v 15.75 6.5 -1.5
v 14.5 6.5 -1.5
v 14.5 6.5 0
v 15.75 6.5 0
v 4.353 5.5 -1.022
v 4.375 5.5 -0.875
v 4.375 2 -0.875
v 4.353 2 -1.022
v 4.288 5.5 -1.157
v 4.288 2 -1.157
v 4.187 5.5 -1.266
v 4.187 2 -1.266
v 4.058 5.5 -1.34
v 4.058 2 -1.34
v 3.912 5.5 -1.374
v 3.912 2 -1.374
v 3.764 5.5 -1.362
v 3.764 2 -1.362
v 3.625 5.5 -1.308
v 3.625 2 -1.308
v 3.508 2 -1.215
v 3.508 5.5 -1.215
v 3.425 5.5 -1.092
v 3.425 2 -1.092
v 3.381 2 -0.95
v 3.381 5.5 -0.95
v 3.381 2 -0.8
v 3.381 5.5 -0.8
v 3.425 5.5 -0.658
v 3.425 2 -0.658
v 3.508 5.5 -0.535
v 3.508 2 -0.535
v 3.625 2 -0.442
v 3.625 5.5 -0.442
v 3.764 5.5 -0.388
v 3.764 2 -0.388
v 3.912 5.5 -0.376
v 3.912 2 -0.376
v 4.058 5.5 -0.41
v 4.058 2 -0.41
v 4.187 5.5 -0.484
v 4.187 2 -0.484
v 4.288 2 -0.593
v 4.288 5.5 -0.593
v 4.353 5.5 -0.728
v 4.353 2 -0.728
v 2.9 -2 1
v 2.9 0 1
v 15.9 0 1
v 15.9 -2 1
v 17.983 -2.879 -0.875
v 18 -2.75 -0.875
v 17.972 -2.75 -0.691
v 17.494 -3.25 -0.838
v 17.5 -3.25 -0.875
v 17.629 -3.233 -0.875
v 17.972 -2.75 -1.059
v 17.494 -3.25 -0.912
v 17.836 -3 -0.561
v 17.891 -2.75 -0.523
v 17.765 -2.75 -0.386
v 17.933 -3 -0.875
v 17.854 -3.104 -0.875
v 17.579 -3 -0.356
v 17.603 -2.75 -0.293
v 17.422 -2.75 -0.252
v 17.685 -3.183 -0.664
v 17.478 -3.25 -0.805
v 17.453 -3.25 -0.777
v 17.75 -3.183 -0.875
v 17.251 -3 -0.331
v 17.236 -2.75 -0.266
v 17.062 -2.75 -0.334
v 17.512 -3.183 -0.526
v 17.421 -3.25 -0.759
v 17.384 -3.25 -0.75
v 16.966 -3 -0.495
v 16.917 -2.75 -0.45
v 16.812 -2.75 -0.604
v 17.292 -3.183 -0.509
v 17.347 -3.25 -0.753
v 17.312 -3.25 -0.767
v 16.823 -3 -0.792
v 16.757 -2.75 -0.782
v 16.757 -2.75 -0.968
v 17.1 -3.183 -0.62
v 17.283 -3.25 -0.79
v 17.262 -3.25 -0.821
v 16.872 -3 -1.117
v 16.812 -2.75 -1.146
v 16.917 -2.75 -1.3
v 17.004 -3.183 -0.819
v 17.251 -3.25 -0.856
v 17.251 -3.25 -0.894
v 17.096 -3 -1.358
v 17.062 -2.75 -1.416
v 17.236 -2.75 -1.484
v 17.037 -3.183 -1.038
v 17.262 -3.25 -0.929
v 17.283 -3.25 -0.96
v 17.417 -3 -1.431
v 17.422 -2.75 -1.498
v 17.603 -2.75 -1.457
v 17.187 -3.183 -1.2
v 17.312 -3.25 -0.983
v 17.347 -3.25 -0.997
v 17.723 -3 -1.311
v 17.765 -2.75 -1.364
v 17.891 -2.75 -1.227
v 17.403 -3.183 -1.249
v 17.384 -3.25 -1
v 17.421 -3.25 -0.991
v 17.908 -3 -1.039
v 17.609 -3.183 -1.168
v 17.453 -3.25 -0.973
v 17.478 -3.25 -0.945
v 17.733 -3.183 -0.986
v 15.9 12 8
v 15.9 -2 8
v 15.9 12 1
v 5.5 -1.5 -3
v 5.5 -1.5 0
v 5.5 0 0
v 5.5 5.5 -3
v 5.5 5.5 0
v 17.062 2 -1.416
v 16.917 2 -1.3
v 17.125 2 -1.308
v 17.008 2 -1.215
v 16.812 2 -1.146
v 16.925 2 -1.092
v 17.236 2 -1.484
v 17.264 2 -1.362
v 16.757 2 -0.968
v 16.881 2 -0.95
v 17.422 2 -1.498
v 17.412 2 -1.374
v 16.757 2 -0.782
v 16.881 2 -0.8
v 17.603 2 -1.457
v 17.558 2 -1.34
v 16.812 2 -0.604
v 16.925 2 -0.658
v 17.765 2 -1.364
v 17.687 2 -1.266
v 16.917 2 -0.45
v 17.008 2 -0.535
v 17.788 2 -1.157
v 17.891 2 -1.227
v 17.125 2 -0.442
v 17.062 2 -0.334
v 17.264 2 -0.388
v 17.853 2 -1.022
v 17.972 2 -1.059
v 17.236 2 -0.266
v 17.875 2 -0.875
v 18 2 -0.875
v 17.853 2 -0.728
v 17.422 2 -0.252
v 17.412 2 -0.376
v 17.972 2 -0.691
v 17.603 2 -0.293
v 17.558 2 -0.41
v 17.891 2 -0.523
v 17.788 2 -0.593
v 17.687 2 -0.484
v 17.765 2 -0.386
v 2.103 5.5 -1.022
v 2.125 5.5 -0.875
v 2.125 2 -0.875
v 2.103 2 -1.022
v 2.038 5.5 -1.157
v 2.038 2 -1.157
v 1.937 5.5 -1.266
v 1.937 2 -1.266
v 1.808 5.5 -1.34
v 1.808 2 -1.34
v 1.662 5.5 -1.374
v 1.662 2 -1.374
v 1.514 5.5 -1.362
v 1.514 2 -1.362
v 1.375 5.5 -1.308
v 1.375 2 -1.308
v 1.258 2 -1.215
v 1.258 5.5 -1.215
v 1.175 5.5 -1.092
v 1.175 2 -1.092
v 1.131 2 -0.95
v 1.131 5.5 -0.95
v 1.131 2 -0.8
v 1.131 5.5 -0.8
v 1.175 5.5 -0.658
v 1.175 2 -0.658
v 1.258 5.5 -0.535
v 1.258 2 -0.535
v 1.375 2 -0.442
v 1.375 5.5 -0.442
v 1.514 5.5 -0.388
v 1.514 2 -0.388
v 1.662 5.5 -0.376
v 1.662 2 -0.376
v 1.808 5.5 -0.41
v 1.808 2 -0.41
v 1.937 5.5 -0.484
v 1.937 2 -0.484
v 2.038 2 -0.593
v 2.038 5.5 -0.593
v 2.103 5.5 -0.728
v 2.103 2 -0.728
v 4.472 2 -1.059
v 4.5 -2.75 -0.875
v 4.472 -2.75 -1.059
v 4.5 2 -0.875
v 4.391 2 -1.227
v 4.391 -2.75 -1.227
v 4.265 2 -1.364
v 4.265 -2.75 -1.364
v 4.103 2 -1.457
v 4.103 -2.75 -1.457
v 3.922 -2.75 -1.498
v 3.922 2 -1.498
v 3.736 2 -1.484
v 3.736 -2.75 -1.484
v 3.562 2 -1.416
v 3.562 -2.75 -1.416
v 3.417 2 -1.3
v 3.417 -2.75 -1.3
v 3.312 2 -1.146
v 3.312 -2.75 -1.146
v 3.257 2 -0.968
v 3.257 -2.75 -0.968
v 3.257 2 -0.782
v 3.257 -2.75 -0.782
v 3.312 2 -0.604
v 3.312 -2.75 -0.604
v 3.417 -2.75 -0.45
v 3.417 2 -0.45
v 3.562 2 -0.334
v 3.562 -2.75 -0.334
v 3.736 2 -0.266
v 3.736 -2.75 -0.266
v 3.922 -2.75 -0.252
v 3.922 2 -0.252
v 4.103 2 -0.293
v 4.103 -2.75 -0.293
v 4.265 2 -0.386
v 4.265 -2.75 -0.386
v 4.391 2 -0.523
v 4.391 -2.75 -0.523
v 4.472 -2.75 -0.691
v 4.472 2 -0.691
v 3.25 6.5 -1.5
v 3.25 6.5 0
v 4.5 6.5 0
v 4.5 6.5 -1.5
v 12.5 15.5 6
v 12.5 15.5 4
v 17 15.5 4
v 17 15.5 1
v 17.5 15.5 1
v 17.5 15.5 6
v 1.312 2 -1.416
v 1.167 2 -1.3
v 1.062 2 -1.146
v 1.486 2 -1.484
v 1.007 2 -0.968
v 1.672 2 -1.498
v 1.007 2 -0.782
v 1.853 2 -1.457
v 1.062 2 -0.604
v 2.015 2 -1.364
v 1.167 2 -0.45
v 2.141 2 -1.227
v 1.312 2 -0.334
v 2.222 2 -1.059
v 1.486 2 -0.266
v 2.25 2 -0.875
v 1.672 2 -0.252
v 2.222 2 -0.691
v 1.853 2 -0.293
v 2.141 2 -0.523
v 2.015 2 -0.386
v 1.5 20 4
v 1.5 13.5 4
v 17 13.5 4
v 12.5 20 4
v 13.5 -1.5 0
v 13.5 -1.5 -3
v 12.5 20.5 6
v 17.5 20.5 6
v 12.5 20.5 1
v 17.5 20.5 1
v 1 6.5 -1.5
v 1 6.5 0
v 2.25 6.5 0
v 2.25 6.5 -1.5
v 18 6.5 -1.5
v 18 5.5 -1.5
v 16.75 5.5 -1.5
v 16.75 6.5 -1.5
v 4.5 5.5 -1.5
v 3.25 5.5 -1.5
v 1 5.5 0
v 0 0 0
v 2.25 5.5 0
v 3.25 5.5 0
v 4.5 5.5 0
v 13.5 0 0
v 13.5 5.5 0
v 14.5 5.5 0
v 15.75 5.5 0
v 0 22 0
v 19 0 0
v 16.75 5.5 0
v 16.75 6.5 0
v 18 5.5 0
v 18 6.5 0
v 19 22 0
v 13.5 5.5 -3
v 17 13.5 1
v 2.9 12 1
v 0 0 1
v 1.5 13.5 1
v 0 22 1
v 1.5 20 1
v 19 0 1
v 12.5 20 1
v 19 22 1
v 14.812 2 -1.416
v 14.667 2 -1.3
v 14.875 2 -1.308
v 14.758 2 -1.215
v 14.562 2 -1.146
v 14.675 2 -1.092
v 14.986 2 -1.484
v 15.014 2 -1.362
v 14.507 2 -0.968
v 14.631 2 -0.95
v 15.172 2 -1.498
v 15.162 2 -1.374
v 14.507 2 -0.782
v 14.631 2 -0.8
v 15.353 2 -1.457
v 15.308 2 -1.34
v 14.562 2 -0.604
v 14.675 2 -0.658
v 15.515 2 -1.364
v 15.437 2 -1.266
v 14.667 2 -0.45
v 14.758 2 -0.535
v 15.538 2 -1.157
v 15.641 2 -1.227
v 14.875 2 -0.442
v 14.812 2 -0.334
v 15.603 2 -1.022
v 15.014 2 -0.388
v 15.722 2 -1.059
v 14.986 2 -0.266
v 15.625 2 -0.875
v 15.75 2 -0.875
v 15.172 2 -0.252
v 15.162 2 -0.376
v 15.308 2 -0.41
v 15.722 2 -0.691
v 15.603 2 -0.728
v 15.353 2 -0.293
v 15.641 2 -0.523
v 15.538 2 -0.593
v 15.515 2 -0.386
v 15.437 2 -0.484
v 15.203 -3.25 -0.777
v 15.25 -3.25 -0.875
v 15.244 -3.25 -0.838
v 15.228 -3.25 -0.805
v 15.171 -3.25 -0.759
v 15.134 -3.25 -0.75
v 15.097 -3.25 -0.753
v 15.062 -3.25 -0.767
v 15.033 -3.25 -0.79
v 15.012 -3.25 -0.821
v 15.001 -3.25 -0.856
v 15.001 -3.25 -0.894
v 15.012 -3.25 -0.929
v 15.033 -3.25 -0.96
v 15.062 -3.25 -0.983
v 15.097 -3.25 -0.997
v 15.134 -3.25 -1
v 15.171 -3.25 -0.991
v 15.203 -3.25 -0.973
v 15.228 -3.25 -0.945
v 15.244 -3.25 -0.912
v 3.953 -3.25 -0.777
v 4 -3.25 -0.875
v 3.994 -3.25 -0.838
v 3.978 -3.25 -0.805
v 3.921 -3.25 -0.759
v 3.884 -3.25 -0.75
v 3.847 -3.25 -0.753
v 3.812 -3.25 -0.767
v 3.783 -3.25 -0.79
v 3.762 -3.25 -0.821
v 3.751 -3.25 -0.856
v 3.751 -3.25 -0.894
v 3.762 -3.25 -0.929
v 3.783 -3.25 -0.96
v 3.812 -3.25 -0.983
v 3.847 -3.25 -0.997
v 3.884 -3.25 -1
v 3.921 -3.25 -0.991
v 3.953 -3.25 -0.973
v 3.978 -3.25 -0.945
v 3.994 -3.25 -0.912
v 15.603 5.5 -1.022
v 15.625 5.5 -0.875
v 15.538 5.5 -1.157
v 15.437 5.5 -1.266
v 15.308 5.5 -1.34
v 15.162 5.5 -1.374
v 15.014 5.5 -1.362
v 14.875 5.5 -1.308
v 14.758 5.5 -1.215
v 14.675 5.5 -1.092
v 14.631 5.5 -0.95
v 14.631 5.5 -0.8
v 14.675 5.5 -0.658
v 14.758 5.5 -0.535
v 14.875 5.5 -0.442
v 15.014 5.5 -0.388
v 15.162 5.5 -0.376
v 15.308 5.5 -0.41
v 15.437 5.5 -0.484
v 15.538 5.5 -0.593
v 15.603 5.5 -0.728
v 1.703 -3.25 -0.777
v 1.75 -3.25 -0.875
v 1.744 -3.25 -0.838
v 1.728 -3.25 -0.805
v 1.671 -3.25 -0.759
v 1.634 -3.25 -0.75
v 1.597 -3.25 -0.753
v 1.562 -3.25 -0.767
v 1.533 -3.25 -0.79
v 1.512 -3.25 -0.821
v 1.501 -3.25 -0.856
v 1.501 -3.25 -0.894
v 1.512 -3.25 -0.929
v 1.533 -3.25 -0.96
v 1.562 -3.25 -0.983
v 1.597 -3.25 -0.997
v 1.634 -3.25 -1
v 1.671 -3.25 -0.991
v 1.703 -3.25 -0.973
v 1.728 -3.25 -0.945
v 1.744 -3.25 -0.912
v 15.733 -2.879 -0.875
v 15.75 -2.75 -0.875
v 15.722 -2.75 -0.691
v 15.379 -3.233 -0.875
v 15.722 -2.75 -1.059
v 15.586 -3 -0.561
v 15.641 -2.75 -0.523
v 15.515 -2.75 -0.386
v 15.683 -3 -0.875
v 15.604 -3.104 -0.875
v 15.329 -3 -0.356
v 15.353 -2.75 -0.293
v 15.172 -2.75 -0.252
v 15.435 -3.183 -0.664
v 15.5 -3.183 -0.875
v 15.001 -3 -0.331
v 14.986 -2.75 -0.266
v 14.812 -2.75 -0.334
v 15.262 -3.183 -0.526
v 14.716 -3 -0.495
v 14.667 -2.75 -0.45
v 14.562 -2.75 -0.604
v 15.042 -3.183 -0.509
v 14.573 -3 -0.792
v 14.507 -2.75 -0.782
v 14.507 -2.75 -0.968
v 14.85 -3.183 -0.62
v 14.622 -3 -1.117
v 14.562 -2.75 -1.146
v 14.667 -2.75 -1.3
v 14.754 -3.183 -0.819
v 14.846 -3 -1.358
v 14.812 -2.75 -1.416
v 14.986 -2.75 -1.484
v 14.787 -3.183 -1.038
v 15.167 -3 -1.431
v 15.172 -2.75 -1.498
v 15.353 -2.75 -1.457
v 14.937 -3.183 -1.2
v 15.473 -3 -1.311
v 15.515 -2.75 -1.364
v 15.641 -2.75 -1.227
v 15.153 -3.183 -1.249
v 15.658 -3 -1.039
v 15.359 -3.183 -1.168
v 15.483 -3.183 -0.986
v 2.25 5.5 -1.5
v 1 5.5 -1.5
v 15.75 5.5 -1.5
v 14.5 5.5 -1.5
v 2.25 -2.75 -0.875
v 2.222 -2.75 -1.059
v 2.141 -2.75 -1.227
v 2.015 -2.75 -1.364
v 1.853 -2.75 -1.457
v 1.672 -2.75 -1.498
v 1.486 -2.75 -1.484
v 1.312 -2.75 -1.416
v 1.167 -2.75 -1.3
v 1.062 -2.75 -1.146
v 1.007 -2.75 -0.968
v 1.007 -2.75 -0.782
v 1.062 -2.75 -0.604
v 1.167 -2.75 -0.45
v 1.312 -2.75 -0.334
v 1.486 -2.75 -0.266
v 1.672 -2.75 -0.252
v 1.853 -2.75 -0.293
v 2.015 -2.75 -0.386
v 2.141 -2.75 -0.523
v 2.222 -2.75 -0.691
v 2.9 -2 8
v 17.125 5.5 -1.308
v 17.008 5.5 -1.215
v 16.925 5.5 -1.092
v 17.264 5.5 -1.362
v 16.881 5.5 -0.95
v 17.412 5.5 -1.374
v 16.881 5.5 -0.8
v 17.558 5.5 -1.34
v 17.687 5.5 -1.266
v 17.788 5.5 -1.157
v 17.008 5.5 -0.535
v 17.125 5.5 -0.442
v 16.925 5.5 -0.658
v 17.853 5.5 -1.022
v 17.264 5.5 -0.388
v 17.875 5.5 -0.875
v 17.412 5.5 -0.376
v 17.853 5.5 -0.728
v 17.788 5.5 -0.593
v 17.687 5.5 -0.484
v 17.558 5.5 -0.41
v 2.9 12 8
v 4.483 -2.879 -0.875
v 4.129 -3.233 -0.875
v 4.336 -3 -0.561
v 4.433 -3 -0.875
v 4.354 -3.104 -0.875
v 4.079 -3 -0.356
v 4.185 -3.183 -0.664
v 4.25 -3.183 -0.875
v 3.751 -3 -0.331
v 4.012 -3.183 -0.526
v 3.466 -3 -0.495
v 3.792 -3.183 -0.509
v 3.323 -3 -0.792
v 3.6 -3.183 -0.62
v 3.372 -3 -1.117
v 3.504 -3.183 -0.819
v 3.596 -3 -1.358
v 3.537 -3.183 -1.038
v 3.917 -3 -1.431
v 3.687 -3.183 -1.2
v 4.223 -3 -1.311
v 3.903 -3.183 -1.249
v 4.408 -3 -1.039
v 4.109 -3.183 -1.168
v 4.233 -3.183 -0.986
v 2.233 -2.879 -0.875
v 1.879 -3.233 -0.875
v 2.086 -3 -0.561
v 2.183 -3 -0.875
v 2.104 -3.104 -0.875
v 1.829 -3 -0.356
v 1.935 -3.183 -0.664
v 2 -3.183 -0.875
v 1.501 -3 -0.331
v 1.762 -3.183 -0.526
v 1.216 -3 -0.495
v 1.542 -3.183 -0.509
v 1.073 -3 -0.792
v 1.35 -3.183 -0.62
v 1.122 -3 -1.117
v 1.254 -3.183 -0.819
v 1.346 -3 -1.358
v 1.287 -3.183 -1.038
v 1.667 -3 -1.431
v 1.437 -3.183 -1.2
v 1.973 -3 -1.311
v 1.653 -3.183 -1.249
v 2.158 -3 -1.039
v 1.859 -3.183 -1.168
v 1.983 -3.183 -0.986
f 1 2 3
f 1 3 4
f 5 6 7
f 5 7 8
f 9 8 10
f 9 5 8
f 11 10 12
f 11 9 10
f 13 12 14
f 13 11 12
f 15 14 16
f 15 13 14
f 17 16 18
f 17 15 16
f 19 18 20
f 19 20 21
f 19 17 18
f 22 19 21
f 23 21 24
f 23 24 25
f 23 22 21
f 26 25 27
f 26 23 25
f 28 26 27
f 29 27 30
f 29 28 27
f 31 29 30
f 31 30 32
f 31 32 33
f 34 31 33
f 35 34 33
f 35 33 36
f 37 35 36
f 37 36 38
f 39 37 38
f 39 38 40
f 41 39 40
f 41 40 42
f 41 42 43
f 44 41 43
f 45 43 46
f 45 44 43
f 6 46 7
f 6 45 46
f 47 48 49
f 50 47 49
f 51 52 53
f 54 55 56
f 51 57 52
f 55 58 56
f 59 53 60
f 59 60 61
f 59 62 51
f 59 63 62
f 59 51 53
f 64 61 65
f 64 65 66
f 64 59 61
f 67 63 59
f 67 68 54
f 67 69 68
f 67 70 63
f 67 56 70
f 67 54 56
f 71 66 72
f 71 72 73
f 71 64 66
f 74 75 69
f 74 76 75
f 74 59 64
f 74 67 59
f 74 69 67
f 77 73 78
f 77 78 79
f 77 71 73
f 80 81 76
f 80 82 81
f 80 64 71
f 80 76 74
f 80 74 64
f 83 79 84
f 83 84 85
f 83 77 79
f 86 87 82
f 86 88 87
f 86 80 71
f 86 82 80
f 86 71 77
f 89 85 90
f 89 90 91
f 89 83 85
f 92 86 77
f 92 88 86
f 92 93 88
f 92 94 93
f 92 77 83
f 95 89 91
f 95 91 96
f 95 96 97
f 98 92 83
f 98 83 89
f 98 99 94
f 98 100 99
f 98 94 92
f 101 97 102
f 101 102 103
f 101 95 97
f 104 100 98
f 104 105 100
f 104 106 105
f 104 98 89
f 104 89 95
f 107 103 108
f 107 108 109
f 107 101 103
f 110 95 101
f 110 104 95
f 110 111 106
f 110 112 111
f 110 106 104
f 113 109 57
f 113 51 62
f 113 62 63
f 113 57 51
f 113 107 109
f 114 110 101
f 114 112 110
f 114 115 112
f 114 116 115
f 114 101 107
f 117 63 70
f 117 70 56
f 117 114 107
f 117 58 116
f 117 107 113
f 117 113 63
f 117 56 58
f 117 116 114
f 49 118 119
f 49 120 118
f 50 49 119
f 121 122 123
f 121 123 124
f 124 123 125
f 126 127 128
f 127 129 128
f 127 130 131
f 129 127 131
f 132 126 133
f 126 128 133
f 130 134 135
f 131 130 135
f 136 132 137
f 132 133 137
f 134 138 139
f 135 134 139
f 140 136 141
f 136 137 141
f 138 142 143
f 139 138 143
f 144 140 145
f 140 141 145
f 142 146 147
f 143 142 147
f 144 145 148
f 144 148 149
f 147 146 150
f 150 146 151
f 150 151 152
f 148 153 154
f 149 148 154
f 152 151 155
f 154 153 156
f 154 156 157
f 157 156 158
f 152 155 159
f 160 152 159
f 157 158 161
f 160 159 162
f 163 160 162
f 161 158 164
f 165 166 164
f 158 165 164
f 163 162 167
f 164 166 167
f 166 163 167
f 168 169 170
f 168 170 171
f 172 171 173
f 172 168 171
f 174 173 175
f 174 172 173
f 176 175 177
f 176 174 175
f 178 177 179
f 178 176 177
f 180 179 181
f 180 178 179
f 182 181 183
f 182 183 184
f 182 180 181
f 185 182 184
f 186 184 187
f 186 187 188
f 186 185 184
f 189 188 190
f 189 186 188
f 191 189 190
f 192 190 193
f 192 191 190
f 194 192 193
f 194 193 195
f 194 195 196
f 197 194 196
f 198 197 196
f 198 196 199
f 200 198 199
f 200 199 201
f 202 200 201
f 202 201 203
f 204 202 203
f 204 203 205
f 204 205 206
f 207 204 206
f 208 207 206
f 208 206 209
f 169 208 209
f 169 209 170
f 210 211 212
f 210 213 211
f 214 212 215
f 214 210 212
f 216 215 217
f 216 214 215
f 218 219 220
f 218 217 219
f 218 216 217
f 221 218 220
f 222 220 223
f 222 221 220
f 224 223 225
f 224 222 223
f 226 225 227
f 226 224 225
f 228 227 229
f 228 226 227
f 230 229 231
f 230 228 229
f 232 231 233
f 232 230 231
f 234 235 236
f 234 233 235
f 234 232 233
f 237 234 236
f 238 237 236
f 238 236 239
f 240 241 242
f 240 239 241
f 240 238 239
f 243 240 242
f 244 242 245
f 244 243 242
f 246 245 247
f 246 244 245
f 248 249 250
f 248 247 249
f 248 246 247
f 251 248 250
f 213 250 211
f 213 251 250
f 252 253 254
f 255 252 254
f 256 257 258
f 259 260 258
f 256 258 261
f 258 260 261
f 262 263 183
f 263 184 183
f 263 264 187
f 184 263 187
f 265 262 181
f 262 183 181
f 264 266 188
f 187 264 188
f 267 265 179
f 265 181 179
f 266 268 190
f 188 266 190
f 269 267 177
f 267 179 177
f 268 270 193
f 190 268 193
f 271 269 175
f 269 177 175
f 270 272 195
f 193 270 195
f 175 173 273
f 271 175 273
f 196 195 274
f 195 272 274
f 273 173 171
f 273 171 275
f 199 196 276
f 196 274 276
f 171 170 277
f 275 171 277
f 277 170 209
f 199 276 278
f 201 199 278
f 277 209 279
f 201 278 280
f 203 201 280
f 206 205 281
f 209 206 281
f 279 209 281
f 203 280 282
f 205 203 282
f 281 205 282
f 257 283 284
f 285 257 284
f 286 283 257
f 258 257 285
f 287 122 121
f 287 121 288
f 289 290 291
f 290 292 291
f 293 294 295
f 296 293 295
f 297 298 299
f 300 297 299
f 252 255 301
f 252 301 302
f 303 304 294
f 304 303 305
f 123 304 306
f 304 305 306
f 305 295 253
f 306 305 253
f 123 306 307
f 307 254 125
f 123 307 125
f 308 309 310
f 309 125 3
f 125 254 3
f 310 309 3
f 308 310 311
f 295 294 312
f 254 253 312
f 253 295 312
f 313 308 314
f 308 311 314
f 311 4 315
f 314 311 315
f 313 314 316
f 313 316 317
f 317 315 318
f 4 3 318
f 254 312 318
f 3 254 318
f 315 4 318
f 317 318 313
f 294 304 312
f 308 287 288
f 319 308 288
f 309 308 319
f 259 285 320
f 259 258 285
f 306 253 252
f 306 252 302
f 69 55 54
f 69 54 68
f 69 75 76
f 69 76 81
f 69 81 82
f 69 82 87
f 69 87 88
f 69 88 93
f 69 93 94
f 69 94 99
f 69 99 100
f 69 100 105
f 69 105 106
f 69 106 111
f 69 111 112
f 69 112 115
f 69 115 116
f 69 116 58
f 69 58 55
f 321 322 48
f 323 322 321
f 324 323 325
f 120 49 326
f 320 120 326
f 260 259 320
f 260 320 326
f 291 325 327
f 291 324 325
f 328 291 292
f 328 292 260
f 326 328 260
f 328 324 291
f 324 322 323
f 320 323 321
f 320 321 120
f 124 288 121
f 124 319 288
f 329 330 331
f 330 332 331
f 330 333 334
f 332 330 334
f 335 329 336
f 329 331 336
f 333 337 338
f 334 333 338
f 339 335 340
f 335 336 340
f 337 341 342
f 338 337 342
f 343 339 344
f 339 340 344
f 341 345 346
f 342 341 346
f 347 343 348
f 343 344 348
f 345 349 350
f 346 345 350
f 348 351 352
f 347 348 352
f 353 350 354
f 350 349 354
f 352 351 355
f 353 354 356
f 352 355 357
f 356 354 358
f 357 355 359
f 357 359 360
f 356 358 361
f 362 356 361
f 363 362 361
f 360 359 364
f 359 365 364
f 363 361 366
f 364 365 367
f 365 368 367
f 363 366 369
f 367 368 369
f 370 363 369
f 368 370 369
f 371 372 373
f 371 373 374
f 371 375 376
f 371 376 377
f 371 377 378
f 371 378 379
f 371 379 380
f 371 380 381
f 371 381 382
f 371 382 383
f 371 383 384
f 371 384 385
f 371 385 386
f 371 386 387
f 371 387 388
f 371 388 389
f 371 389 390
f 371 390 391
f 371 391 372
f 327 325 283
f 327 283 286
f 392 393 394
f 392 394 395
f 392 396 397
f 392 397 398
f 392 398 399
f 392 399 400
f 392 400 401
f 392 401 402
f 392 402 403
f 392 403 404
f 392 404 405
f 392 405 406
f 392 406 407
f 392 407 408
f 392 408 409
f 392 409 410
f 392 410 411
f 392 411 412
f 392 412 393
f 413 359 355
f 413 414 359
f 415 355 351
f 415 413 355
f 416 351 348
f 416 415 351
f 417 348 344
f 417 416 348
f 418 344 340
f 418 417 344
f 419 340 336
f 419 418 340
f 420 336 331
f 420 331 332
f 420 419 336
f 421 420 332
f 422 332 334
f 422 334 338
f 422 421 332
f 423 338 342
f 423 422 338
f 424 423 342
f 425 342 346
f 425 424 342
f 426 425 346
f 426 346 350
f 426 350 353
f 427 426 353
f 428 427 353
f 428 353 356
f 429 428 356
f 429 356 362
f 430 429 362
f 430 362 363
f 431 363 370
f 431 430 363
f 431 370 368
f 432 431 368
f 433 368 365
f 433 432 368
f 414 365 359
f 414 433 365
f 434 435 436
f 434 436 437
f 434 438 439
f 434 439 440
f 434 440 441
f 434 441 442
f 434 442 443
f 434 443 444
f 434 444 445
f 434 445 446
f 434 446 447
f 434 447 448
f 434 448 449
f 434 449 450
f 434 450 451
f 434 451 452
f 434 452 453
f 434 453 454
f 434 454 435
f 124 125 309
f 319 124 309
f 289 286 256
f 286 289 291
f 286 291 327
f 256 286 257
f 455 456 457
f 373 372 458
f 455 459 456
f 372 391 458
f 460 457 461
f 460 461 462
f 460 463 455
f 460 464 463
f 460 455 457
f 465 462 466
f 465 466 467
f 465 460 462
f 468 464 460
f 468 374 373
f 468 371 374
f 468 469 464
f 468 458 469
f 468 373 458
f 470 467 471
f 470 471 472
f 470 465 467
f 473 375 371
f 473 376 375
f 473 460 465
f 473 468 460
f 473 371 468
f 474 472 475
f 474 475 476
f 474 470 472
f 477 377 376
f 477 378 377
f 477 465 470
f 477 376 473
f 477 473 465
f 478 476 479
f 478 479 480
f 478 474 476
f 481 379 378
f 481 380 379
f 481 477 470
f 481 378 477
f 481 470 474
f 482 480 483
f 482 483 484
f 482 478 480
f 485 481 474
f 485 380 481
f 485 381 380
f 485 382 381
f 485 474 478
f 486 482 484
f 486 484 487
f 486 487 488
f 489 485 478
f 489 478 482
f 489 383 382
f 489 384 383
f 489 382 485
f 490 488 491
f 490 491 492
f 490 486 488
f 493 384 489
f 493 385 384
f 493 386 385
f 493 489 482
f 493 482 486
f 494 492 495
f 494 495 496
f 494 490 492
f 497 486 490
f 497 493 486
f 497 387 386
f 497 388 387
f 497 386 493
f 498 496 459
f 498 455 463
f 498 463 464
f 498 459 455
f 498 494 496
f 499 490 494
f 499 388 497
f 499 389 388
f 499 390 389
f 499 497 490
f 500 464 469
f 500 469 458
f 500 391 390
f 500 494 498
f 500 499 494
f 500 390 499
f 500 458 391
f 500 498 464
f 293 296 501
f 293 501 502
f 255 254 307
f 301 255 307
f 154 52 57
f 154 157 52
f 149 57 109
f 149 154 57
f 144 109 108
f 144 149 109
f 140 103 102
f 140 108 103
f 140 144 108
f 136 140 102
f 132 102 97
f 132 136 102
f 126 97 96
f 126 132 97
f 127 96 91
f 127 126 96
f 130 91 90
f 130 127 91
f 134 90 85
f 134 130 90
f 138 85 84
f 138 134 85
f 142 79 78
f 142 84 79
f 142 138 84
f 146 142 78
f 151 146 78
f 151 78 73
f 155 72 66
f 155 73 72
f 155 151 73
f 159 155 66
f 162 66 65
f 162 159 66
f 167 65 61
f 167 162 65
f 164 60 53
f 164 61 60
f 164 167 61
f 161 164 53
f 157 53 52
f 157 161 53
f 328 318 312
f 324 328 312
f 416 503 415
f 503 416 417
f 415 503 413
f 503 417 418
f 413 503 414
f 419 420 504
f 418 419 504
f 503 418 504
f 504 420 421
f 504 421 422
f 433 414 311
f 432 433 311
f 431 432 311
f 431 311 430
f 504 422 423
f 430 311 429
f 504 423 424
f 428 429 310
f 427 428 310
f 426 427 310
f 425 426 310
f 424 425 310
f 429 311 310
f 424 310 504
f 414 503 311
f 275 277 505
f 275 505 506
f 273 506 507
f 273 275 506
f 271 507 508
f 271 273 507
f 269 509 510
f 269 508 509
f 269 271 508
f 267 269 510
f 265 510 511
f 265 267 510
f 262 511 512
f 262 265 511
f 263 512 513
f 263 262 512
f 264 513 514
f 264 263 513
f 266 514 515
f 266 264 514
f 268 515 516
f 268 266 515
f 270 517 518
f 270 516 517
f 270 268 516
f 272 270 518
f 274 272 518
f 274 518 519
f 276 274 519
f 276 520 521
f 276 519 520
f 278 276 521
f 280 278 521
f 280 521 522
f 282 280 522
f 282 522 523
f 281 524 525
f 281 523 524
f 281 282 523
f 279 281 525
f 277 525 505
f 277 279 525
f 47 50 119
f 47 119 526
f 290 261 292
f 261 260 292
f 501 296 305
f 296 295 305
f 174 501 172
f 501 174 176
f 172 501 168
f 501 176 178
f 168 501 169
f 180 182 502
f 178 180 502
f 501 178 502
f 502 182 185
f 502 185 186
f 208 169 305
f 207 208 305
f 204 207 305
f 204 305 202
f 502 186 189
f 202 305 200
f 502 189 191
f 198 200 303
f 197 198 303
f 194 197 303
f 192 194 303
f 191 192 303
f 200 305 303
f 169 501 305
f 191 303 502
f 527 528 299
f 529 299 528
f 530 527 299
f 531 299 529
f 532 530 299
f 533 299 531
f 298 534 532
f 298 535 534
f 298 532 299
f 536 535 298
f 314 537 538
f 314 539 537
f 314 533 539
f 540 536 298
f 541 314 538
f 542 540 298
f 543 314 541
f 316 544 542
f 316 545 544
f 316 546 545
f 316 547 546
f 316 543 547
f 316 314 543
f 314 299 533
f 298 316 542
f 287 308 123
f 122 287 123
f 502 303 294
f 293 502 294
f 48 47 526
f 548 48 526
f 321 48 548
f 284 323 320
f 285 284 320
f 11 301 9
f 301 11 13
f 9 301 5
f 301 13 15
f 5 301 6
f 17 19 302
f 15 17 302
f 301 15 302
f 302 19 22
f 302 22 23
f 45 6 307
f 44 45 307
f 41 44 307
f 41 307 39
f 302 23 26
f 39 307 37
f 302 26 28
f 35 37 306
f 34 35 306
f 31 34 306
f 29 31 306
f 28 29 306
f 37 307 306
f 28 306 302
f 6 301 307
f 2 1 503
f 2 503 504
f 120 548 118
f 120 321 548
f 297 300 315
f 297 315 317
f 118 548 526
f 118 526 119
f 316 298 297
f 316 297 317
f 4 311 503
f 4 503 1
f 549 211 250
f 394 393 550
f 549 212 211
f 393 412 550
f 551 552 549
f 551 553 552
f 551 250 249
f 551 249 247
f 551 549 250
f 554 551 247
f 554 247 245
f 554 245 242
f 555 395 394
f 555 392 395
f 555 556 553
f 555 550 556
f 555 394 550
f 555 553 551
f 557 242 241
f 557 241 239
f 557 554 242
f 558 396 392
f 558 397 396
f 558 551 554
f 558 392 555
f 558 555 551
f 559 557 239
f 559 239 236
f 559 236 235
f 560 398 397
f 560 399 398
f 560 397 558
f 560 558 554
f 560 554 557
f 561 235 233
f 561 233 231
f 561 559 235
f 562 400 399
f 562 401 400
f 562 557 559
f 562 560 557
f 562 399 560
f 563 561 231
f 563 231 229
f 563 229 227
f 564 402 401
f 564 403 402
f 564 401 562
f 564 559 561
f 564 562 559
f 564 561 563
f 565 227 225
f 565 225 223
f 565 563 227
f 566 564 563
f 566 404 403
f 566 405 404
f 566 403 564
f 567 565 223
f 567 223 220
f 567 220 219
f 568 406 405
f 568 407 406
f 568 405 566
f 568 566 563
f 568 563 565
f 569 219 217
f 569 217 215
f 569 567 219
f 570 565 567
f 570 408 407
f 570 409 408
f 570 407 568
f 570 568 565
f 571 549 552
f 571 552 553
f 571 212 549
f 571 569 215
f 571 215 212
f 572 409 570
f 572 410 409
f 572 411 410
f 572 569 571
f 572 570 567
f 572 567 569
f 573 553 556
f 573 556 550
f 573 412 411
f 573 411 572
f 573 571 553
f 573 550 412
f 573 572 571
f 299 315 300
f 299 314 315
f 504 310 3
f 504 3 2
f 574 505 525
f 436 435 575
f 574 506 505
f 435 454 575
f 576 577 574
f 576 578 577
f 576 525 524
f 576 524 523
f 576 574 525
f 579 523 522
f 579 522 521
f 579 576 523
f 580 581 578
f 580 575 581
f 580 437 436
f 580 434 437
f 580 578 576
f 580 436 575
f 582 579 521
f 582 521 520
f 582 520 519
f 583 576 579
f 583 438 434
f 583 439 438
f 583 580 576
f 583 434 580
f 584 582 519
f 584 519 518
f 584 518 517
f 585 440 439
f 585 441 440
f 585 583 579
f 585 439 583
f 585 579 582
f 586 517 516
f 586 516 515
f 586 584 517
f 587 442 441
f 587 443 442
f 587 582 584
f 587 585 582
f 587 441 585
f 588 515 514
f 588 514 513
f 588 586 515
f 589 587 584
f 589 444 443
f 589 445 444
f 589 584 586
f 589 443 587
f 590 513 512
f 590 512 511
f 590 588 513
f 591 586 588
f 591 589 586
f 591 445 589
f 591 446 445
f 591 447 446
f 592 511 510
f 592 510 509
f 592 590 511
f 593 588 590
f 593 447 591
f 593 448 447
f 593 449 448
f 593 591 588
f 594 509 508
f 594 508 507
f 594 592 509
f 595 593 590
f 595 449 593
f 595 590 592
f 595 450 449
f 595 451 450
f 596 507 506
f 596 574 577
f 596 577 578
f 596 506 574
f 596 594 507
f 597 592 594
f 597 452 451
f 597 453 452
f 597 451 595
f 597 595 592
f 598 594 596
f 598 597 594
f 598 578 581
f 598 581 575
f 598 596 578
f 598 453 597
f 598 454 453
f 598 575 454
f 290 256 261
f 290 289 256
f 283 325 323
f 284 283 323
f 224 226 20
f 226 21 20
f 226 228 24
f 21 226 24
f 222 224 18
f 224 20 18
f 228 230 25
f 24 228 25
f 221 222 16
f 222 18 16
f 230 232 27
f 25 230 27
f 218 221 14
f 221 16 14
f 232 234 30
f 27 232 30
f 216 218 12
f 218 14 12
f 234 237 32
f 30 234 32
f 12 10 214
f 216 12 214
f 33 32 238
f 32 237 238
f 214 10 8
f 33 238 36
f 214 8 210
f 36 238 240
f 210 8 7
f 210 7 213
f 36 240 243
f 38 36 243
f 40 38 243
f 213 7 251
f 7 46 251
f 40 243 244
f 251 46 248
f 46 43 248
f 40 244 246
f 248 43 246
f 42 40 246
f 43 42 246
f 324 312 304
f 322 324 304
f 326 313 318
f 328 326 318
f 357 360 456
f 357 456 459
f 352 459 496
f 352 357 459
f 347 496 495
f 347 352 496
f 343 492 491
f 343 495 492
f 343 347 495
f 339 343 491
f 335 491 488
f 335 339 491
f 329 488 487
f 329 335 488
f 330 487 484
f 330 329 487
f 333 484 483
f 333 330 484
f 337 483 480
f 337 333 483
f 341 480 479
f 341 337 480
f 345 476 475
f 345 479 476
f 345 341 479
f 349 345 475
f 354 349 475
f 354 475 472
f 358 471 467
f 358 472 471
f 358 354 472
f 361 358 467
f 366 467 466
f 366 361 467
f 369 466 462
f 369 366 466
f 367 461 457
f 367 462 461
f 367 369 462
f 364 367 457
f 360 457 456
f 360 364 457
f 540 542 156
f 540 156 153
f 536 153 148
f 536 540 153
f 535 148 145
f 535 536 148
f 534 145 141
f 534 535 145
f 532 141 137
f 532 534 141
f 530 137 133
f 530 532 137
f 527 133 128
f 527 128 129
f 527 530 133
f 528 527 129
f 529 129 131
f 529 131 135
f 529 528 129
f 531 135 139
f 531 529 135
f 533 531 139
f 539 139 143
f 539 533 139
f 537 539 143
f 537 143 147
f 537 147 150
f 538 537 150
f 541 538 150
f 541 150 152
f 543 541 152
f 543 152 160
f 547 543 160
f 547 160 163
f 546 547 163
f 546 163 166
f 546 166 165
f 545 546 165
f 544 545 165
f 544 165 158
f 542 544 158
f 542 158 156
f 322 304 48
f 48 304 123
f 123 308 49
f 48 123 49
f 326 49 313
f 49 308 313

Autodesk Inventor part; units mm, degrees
ref_plane "YZ Plane" through (0, 0, 0) normal (1, 0, 0) x (0, 1, 0)
ref_plane "XZ Plane" through (0, 0, 0) normal (0, 1, 0) x (-1, 0, 0)
ref_plane "XY Plane" through (0, 0, 0) normal (0, 0, 1) x (1, 0, 0)
sketch "Sketch1" plane through (0, 0, 0) normal (0, 0, 1) x (1, 0, 0)
  line L0 (0, 0) -> (19, 0)
  line L1 (19, 0) -> (19, 22)
  line L2 (19, 22) -> (0, 22)
  line L3 (0, 22) -> (0, 0)
  dimension "d0" = 19
  dimension "d1" = 22
extrude "Extrusion1" add sketch "Sketch1" along normal blind 1
sketch "Sketch2" plane through (0, 0, 1) normal (0, 0, 1) x (1, 0, 0)
  line L0 (0, 0) -> (19, 0) projected
  line L1 (0, 0) -> (2.9, 0)
  line L2 (2.9, 0) -> (2.9, 12)
  line L3 (2.9, 12) -> (0, 12)
  line L4 (0, 12) -> (0, 0)
  line L5 (2.9, 12) -> (15.9, 12)
  line L6 (15.9, 12) -> (15.9, -2)
  line L7 (15.9, -2) -> (2.9, -2)
  line L8 (2.9, -2) -> (2.9, 12)
  dimension "d4" = 2.9
  dimension "d5" = 12
  dimension "d6" = 13
  dimension "d7" = 14
extrude "Extrusion2" add sketch "Sketch2" along normal blind 7 contours L2 L5 L6 L0 | L0 L6 L7 L8
sketch "Sketch3" plane through (0, 0, 0) normal (0, 0, -1) x (-1, 0, 0)
  line L0 (-19, 0) -> (-19, 22) projected
  line L1 (-19, 0) -> (-13.5, 0)
  line L2 (-13.5, 0) -> (-13.5, 5)
  line L3 (-13.5, 5) -> (-19, 5)
  line L4 (-19, 5) -> (-19, 0)
  line L5 (-13.5, 0) -> (-5.5, 0)
  line L6 (-5.5, 0) -> (-5.5, 5.5)
  line L7 (-5.5, 5.5) -> (-13.5, 5.5)
  line L8 (-13.5, 5.5) -> (-13.5, 0)
  line L9 (-13.5, 0) -> (-5.5, 0)
  line L10 (-5.5, 0) -> (-5.5, -1.5)
  line L11 (-5.5, -1.5) -> (-13.5, -1.5)
  line L12 (-13.5, -1.5) -> (-13.5, 0)
  point P0 (0, 0)
  dimension "d10" = 5.5
  dimension "d11" = 5
  dimension "d12" = 8
  dimension "d13" = 5.5
  dimension "d16" = 8
  dimension "d17" = 1.5
extrude "Extrusion3" add sketch "Sketch3" along normal blind 3 contours L2 L8 L7 L6 L5 | L5 L10 L11 L12
sketch "Sketch4" plane through (0, 0, 1) normal (0, 0, 1) x (1, 0, 0)
  line L0 (19, 22) -> (0, 22) projected
  line L1 (0, 22) -> (1.5, 22)
  line L2 (1.5, 22) -> (1.5, 20.5)
  line L3 (1.5, 20.5) -> (0, 20.5)
  line L4 (0, 20.5) -> (0, 22)
  line L5 (19, 22) -> (17.5, 22)
  line L6 (17.5, 22) -> (17.5, 20.5)
  line L7 (17.5, 20.5) -> (19, 20.5)
  line L8 (19, 20.5) -> (19, 22)
  line L9 (17.5, 20.5) -> (1.5, 20.5)
  line L10 (1.5, 20.5) -> (1.5, 13.5)
  line L11 (1.5, 13.5) -> (17.5, 13.5)
  line L12 (17.5, 13.5) -> (17.5, 20.5)
  point P0 (0, 0)
  dimension "d18" = 1.5
  dimension "d19" = 1.5
  dimension "d20" = 1.5
  dimension "d21" = 1.5
  dimension "d22" = 16
  dimension "d23" = 7
extrude "Extrusion4" add sketch "Sketch4" along normal blind 3 contours L12 L11 L10 L9
sketch "Sketch5" plane through (0, 0, 4) normal (0, 0, 1) x (1, 0, 0)
  line L0 (17.5, 20.5) -> (1.5, 20.5) projected
  line L1 (17.5, 20.5) -> (12.5, 20.5)
  line L2 (12.5, 20.5) -> (12.5, 15.5)
  line L3 (12.5, 15.5) -> (17.5, 15.5)
  line L4 (17.5, 15.5) -> (17.5, 20.5)
  point P0 (0, 0)
  dimension "d26" = 5
  dimension "d27" = 5
extrude "Extrusion5" add sketch "Sketch5" along normal blind 2
sketch "Sketch6" plane through (1.5, 20.5, 1) normal (0, 1, 0) x (1, 0, 0)
  line L0 (0, -3) -> (16, -3) projected
  line L1 (0, -3) -> (11, -3)
  line L2 (11, -3) -> (11, 0)
  line L3 (11, 0) -> (0, 0)
  line L4 (0, 0) -> (0, -3)
  point P0 (-1.5, 1)
  dimension "d30" = 11
  dimension "d31" = 3
extrude "Extrusion6" cut sketch "Sketch6" against normal blind 0.5
sketch "Sketch7" plane through (17.5, 13.5, 1) normal (1, 0, 0) x (0, 0, -1)
  line L0 (0, 0) -> (-3, 0) projected
  line L1 (-3, 0) -> (0, 0)
  line L2 (0, 0) -> (0, 2)
  line L3 (0, 2) -> (-3, 2)
  line L4 (-3, 2) -> (-3, 0)
  point P0 (1, -13.5)
  dimension "d34" = 3
  dimension "d35" = 2
extrude "Extrusion7" cut sketch "Sketch7" against normal blind 0.5
sketch "Sketch8" plane through (0, 0, 0) normal (0, 0, -1) x (-1, 0, 0)
  line L0 (-19, 0) -> (-19, 22) projected
  line L1 (-19, 0) -> (-18, 0)
  line L2 (-18, 0) -> (-18, 6)
  line L3 (-18, 6) -> (-19, 6)
  line L4 (-19, 6) -> (-19, 0)
  line L5 (-18, 6) -> (-16.75, 6)
  line L6 (-16.75, 6) -> (-16.75, 5.5)
  line L7 (-16.75, 5.5) -> (-18, 5.5)
  line L8 (-18, 5.5) -> (-18, 6)
  line L9 (-16.75, 5.5) -> (-15.75, 5.5)
  line L10 (-15.75, 5.5) -> (-15.75, 6)
  line L11 (-15.75, 6) -> (-16.75, 6)
  line L12 (-16.75, 6) -> (-16.75, 5.5)
  line L13 (-15.75, 5.5) -> (-14.5, 5.5)
  line L14 (-14.5, 5.5) -> (-14.5, 6)
  line L15 (-14.5, 6) -> (-15.75, 6)
  line L16 (-15.75, 6) -> (-15.75, 5.5)
  line L17 (-13.5, 5.5) -> (-5.5, 5.5) projected
  line L18 (-14.5, 6) -> (-13.5, 6)
  line L19 (-13.5, 6) -> (-13.5, 5.5)
  line L20 (-13.5, 5.5) -> (-14.5, 5.5)
  line L21 (-14.5, 5.5) -> (-14.5, 6)
  point P0 (0, 0)
  dimension "d38" = 1
  dimension "d39" = 6
  dimension "d40" = 1.25
  dimension "d41" = 0.5
  dimension "d42" = 1
  dimension "d43" = 1.25
  dimension "d44" = 1
  dimension "d45" = 0.5
extrude "Extrusion8" add sketch "Sketch8" along normal blind 1.5 contours L5 L6 L7 L2 | L15 L14 L13 L10
sketch "Sketch9" plane through (14.5, 6, 0) normal (0, 1, 0) x (1, 0, 0)
  line L0 (1.25, 1.5) -> (0, 1.5) projected
  line L1 (0, 1.5) -> (1.25, 1.5)
  line L2 (1.25, 1.5) -> (1.25, 0)
  line L3 (1.25, 0) -> (0, 0)
  line L4 (0, 0) -> (0, 1.5)
  line L5 (3.5, 1.5) -> (2.25, 1.5) projected
  line L6 (2.25, 1.5) -> (3.5, 1.5)
  line L7 (3.5, 1.5) -> (3.5, 0)
  line L8 (3.5, 0) -> (2.25, 0)
  line L9 (2.25, 0) -> (2.25, 1.5)
  point P0 (-14.5, 0)
  dimension "d48" = 1.25
  dimension "d49" = 1.5
  dimension "d50" = 1.25
  dimension "d51" = 1.5
extrude "Extrusion9" add sketch "Sketch9" along normal blind 0.5
sketch "Sketch10" plane through (16.75, 5.5, 0) normal (0, -1, 0) x (1, 0, 0)
  line L0 (1.25, 0) -> (1.25, -1.5) projected
  line L1 (1.25, -1.5) -> (0.625, -1.5)
  line L2 (0.625, -1.5) -> (0.625, -0.875)
  line L3 (0.625, -0.875) -> (1.25, -0.875)
  line L4 (1.25, -0.875) -> (1.25, -1.5)
  circle A0 centre (0.625, -0.875) radius 0.5
  line L5 (-1, -1.5) -> (-2.25, -1.5) projected
  line L6 (-1, -1.5) -> (-1.625, -1.5)
  line L7 (-1.625, -1.5) -> (-1.625, -0.875)
  line L8 (-1.625, -0.875) -> (-1, -0.875)
  line L9 (-1, -0.875) -> (-1, -1.5)
  circle A1 centre (-1.625, -0.875) radius 0.5
  point P0 (-16.75, 0)
  dimension "d54" = 0.625
  dimension "d55" = 0.625
  dimension "d56" = 1
  dimension "d57" = 0.625
  dimension "d58" = 0.625
  dimension "d59" = 1
extrude "Extrusion10" add sketch "Sketch10" along normal blind 3.5 contours A0 L2 L3 | L3 L2 A0 | A1 L8 L7 | L7 L8 A1
sketch "Sketch11" plane through (17.375, 2, -0.875) normal (0, -1, 0) x (1, 0, 0)
  circle A0 centre (0, 0) radius 0.625
  point P0 (-17.375, 0.875)
  dimension "d62" = 1.25
extrude "Extrusion11" add sketch "Sketch11" along normal blind 5.25
sketch "Sketch12" plane through (0, 0, 0) normal (0, 0, -1) x (-1, 0, 0)
  point P0 (0, 0)
sketch "Sketch13" plane through (0, 0, 0) normal (0, 0, -1) x (-1, 0, 0)
  line L0 (0, 0) -> (-2.9, 0) projected
  line L1 (0, 0) -> (-1, 0)
  line L2 (-1, 0) -> (-1, 6.5)
  line L3 (-1, 6.5) -> (0, 6.5)
  line L4 (0, 6.5) -> (0, 0)
  line L5 (-1, 6.5) -> (-2.25, 6.5)
  line L6 (-2.25, 6.5) -> (-2.25, 5.5)
  line L7 (-2.25, 5.5) -> (-1, 5.5)
  line L8 (-1, 5.5) -> (-1, 6.5)
  line L9 (-2.25, 6.5) -> (-3.25, 6.5)
  line L10 (-3.25, 6.5) -> (-3.25, 5.5)
  line L11 (-3.25, 5.5) -> (-2.25, 5.5)
  line L12 (-2.25, 5.5) -> (-2.25, 6.5)
  line L13 (-3.25, 6.5) -> (-4.5, 6.5)
  line L14 (-4.5, 6.5) -> (-4.5, 5.5)
  line L15 (-4.5, 5.5) -> (-3.25, 5.5)
  line L16 (-3.25, 5.5) -> (-3.25, 6.5)
  dimension "d65" = 1
  dimension "d66" = 6.5
  dimension "d67" = 1.25
  dimension "d68" = 1
  dimension "d69" = 1
  dimension "d70" = 1
  dimension "d71" = 1.25
  dimension "d72" = 1
extrude "Extrusion12" add sketch "Sketch13" along normal blind 1.5 contours L7 L6 L5 L2 | L15 L14 L13 L10
sketch "Sketch14" plane through (3.25, 5.5, 0) normal (0, -1, 0) x (1, 0, 0)
  line L0 (0, -1.5) -> (1.25, -1.5) projected
  line L1 (1.25, -1.5) -> (0.625, -1.5)
  line L2 (0.625, -1.5) -> (0.625, -0.875)
  line L3 (0.625, -0.875) -> (1.25, -0.875)
  line L4 (1.25, -0.875) -> (1.25, -1.5)
  circle A0 centre (0.625, -0.875) radius 0.5
  line L5 (-2.25, -1.5) -> (-1, -1.5) projected
  line L6 (-1, -1.5) -> (-1.625, -1.5)
  line L7 (-1.625, -1.5) -> (-1.625, -0.875)
  line L8 (-1.625, -0.875) -> (-1, -0.875)
  line L9 (-1, -0.875) -> (-1, -1.5)
  circle A1 centre (-1.625, -0.875) radius 0.5
  point P0 (-3.25, 0)
  dimension "d75" = 0.625
  dimension "d76" = 0.625
  dimension "d77" = 1
  dimension "d78" = 0.625
  dimension "d79" = 0.625
  dimension "d80" = 1
extrude "Extrusion13" add sketch "Sketch14" along normal blind 3.5 contours A0 L3 L2 | L2 L3 A0 | A1 L8 L7 | L7 L8 A1
sketch "Sketch15" plane through (3.875, 2, -0.875) normal (0, -1, 0) x (1, 0, 0)
  circle A0 centre (0, 0) radius 0.625
  point P0 (-3.875, 0.875)
  dimension "d83" = 1.25
extrude "Extrusion14" add sketch "Sketch15" along normal blind 5.25
sketch "Sketch16" plane through (1.625, 2, -0.875) normal (0, -1, 0) x (1, 0, 0)
  circle A0 centre (0, 0) radius 0.625
  point P0 (-1.625, 0.875)
  dimension "d86" = 1.25
extrude "Extrusion15" add sketch "Sketch16" along normal blind 5.25
sketch "Sketch17" plane through (15.125, 2, -0.875) normal (0, -1, 0) x (1, 0, 0)
  circle A0 centre (0, 0) radius 0.625
  point P0 (-15.125, 0.875)
  dimension "d89" = 1.25
extrude "Extrusion16" add sketch "Sketch17" along normal blind 5.25
fillet "Fillet1" radius 0.5 4 edges at (16.75, -3.25, -0.875) (14.5, -3.25, -0.875) (3.25, -3.25, -0.875) (1, -3.25, -0.875)
sketch "Sketch18" plane through (2.9, -2, 1) normal (0, -1, 0) x (1, 0, 0)
  line L0 (0, 7) -> (13.0027, 7) construction
  line L1 (13.0027, 7) -> (13.0027, 1.5822) construction
  line L2 (13.0027, 1.5822) -> (0, 1.5822) construction
  line L3 (0, 1.5822) -> (0, 7) construction
  point P0 (-2.9, -1)
sketch "Sketch19" plane through (5.5, -1.5, 0) normal (0, -1, 0) x (1, 0, 0)
  line L0 (8, 0) -> (0, 0) projected
  line L1 (0, 0) -> (8, 0) construction
  line L2 (8, 0) -> (8, -3.25) construction
  line L3 (8, -3.25) -> (0, -3.25) construction
  line L4 (0, -3.25) -> (0, 0) construction
  point P0 (-5.5, 0)
properties part number "Battery-Management"
